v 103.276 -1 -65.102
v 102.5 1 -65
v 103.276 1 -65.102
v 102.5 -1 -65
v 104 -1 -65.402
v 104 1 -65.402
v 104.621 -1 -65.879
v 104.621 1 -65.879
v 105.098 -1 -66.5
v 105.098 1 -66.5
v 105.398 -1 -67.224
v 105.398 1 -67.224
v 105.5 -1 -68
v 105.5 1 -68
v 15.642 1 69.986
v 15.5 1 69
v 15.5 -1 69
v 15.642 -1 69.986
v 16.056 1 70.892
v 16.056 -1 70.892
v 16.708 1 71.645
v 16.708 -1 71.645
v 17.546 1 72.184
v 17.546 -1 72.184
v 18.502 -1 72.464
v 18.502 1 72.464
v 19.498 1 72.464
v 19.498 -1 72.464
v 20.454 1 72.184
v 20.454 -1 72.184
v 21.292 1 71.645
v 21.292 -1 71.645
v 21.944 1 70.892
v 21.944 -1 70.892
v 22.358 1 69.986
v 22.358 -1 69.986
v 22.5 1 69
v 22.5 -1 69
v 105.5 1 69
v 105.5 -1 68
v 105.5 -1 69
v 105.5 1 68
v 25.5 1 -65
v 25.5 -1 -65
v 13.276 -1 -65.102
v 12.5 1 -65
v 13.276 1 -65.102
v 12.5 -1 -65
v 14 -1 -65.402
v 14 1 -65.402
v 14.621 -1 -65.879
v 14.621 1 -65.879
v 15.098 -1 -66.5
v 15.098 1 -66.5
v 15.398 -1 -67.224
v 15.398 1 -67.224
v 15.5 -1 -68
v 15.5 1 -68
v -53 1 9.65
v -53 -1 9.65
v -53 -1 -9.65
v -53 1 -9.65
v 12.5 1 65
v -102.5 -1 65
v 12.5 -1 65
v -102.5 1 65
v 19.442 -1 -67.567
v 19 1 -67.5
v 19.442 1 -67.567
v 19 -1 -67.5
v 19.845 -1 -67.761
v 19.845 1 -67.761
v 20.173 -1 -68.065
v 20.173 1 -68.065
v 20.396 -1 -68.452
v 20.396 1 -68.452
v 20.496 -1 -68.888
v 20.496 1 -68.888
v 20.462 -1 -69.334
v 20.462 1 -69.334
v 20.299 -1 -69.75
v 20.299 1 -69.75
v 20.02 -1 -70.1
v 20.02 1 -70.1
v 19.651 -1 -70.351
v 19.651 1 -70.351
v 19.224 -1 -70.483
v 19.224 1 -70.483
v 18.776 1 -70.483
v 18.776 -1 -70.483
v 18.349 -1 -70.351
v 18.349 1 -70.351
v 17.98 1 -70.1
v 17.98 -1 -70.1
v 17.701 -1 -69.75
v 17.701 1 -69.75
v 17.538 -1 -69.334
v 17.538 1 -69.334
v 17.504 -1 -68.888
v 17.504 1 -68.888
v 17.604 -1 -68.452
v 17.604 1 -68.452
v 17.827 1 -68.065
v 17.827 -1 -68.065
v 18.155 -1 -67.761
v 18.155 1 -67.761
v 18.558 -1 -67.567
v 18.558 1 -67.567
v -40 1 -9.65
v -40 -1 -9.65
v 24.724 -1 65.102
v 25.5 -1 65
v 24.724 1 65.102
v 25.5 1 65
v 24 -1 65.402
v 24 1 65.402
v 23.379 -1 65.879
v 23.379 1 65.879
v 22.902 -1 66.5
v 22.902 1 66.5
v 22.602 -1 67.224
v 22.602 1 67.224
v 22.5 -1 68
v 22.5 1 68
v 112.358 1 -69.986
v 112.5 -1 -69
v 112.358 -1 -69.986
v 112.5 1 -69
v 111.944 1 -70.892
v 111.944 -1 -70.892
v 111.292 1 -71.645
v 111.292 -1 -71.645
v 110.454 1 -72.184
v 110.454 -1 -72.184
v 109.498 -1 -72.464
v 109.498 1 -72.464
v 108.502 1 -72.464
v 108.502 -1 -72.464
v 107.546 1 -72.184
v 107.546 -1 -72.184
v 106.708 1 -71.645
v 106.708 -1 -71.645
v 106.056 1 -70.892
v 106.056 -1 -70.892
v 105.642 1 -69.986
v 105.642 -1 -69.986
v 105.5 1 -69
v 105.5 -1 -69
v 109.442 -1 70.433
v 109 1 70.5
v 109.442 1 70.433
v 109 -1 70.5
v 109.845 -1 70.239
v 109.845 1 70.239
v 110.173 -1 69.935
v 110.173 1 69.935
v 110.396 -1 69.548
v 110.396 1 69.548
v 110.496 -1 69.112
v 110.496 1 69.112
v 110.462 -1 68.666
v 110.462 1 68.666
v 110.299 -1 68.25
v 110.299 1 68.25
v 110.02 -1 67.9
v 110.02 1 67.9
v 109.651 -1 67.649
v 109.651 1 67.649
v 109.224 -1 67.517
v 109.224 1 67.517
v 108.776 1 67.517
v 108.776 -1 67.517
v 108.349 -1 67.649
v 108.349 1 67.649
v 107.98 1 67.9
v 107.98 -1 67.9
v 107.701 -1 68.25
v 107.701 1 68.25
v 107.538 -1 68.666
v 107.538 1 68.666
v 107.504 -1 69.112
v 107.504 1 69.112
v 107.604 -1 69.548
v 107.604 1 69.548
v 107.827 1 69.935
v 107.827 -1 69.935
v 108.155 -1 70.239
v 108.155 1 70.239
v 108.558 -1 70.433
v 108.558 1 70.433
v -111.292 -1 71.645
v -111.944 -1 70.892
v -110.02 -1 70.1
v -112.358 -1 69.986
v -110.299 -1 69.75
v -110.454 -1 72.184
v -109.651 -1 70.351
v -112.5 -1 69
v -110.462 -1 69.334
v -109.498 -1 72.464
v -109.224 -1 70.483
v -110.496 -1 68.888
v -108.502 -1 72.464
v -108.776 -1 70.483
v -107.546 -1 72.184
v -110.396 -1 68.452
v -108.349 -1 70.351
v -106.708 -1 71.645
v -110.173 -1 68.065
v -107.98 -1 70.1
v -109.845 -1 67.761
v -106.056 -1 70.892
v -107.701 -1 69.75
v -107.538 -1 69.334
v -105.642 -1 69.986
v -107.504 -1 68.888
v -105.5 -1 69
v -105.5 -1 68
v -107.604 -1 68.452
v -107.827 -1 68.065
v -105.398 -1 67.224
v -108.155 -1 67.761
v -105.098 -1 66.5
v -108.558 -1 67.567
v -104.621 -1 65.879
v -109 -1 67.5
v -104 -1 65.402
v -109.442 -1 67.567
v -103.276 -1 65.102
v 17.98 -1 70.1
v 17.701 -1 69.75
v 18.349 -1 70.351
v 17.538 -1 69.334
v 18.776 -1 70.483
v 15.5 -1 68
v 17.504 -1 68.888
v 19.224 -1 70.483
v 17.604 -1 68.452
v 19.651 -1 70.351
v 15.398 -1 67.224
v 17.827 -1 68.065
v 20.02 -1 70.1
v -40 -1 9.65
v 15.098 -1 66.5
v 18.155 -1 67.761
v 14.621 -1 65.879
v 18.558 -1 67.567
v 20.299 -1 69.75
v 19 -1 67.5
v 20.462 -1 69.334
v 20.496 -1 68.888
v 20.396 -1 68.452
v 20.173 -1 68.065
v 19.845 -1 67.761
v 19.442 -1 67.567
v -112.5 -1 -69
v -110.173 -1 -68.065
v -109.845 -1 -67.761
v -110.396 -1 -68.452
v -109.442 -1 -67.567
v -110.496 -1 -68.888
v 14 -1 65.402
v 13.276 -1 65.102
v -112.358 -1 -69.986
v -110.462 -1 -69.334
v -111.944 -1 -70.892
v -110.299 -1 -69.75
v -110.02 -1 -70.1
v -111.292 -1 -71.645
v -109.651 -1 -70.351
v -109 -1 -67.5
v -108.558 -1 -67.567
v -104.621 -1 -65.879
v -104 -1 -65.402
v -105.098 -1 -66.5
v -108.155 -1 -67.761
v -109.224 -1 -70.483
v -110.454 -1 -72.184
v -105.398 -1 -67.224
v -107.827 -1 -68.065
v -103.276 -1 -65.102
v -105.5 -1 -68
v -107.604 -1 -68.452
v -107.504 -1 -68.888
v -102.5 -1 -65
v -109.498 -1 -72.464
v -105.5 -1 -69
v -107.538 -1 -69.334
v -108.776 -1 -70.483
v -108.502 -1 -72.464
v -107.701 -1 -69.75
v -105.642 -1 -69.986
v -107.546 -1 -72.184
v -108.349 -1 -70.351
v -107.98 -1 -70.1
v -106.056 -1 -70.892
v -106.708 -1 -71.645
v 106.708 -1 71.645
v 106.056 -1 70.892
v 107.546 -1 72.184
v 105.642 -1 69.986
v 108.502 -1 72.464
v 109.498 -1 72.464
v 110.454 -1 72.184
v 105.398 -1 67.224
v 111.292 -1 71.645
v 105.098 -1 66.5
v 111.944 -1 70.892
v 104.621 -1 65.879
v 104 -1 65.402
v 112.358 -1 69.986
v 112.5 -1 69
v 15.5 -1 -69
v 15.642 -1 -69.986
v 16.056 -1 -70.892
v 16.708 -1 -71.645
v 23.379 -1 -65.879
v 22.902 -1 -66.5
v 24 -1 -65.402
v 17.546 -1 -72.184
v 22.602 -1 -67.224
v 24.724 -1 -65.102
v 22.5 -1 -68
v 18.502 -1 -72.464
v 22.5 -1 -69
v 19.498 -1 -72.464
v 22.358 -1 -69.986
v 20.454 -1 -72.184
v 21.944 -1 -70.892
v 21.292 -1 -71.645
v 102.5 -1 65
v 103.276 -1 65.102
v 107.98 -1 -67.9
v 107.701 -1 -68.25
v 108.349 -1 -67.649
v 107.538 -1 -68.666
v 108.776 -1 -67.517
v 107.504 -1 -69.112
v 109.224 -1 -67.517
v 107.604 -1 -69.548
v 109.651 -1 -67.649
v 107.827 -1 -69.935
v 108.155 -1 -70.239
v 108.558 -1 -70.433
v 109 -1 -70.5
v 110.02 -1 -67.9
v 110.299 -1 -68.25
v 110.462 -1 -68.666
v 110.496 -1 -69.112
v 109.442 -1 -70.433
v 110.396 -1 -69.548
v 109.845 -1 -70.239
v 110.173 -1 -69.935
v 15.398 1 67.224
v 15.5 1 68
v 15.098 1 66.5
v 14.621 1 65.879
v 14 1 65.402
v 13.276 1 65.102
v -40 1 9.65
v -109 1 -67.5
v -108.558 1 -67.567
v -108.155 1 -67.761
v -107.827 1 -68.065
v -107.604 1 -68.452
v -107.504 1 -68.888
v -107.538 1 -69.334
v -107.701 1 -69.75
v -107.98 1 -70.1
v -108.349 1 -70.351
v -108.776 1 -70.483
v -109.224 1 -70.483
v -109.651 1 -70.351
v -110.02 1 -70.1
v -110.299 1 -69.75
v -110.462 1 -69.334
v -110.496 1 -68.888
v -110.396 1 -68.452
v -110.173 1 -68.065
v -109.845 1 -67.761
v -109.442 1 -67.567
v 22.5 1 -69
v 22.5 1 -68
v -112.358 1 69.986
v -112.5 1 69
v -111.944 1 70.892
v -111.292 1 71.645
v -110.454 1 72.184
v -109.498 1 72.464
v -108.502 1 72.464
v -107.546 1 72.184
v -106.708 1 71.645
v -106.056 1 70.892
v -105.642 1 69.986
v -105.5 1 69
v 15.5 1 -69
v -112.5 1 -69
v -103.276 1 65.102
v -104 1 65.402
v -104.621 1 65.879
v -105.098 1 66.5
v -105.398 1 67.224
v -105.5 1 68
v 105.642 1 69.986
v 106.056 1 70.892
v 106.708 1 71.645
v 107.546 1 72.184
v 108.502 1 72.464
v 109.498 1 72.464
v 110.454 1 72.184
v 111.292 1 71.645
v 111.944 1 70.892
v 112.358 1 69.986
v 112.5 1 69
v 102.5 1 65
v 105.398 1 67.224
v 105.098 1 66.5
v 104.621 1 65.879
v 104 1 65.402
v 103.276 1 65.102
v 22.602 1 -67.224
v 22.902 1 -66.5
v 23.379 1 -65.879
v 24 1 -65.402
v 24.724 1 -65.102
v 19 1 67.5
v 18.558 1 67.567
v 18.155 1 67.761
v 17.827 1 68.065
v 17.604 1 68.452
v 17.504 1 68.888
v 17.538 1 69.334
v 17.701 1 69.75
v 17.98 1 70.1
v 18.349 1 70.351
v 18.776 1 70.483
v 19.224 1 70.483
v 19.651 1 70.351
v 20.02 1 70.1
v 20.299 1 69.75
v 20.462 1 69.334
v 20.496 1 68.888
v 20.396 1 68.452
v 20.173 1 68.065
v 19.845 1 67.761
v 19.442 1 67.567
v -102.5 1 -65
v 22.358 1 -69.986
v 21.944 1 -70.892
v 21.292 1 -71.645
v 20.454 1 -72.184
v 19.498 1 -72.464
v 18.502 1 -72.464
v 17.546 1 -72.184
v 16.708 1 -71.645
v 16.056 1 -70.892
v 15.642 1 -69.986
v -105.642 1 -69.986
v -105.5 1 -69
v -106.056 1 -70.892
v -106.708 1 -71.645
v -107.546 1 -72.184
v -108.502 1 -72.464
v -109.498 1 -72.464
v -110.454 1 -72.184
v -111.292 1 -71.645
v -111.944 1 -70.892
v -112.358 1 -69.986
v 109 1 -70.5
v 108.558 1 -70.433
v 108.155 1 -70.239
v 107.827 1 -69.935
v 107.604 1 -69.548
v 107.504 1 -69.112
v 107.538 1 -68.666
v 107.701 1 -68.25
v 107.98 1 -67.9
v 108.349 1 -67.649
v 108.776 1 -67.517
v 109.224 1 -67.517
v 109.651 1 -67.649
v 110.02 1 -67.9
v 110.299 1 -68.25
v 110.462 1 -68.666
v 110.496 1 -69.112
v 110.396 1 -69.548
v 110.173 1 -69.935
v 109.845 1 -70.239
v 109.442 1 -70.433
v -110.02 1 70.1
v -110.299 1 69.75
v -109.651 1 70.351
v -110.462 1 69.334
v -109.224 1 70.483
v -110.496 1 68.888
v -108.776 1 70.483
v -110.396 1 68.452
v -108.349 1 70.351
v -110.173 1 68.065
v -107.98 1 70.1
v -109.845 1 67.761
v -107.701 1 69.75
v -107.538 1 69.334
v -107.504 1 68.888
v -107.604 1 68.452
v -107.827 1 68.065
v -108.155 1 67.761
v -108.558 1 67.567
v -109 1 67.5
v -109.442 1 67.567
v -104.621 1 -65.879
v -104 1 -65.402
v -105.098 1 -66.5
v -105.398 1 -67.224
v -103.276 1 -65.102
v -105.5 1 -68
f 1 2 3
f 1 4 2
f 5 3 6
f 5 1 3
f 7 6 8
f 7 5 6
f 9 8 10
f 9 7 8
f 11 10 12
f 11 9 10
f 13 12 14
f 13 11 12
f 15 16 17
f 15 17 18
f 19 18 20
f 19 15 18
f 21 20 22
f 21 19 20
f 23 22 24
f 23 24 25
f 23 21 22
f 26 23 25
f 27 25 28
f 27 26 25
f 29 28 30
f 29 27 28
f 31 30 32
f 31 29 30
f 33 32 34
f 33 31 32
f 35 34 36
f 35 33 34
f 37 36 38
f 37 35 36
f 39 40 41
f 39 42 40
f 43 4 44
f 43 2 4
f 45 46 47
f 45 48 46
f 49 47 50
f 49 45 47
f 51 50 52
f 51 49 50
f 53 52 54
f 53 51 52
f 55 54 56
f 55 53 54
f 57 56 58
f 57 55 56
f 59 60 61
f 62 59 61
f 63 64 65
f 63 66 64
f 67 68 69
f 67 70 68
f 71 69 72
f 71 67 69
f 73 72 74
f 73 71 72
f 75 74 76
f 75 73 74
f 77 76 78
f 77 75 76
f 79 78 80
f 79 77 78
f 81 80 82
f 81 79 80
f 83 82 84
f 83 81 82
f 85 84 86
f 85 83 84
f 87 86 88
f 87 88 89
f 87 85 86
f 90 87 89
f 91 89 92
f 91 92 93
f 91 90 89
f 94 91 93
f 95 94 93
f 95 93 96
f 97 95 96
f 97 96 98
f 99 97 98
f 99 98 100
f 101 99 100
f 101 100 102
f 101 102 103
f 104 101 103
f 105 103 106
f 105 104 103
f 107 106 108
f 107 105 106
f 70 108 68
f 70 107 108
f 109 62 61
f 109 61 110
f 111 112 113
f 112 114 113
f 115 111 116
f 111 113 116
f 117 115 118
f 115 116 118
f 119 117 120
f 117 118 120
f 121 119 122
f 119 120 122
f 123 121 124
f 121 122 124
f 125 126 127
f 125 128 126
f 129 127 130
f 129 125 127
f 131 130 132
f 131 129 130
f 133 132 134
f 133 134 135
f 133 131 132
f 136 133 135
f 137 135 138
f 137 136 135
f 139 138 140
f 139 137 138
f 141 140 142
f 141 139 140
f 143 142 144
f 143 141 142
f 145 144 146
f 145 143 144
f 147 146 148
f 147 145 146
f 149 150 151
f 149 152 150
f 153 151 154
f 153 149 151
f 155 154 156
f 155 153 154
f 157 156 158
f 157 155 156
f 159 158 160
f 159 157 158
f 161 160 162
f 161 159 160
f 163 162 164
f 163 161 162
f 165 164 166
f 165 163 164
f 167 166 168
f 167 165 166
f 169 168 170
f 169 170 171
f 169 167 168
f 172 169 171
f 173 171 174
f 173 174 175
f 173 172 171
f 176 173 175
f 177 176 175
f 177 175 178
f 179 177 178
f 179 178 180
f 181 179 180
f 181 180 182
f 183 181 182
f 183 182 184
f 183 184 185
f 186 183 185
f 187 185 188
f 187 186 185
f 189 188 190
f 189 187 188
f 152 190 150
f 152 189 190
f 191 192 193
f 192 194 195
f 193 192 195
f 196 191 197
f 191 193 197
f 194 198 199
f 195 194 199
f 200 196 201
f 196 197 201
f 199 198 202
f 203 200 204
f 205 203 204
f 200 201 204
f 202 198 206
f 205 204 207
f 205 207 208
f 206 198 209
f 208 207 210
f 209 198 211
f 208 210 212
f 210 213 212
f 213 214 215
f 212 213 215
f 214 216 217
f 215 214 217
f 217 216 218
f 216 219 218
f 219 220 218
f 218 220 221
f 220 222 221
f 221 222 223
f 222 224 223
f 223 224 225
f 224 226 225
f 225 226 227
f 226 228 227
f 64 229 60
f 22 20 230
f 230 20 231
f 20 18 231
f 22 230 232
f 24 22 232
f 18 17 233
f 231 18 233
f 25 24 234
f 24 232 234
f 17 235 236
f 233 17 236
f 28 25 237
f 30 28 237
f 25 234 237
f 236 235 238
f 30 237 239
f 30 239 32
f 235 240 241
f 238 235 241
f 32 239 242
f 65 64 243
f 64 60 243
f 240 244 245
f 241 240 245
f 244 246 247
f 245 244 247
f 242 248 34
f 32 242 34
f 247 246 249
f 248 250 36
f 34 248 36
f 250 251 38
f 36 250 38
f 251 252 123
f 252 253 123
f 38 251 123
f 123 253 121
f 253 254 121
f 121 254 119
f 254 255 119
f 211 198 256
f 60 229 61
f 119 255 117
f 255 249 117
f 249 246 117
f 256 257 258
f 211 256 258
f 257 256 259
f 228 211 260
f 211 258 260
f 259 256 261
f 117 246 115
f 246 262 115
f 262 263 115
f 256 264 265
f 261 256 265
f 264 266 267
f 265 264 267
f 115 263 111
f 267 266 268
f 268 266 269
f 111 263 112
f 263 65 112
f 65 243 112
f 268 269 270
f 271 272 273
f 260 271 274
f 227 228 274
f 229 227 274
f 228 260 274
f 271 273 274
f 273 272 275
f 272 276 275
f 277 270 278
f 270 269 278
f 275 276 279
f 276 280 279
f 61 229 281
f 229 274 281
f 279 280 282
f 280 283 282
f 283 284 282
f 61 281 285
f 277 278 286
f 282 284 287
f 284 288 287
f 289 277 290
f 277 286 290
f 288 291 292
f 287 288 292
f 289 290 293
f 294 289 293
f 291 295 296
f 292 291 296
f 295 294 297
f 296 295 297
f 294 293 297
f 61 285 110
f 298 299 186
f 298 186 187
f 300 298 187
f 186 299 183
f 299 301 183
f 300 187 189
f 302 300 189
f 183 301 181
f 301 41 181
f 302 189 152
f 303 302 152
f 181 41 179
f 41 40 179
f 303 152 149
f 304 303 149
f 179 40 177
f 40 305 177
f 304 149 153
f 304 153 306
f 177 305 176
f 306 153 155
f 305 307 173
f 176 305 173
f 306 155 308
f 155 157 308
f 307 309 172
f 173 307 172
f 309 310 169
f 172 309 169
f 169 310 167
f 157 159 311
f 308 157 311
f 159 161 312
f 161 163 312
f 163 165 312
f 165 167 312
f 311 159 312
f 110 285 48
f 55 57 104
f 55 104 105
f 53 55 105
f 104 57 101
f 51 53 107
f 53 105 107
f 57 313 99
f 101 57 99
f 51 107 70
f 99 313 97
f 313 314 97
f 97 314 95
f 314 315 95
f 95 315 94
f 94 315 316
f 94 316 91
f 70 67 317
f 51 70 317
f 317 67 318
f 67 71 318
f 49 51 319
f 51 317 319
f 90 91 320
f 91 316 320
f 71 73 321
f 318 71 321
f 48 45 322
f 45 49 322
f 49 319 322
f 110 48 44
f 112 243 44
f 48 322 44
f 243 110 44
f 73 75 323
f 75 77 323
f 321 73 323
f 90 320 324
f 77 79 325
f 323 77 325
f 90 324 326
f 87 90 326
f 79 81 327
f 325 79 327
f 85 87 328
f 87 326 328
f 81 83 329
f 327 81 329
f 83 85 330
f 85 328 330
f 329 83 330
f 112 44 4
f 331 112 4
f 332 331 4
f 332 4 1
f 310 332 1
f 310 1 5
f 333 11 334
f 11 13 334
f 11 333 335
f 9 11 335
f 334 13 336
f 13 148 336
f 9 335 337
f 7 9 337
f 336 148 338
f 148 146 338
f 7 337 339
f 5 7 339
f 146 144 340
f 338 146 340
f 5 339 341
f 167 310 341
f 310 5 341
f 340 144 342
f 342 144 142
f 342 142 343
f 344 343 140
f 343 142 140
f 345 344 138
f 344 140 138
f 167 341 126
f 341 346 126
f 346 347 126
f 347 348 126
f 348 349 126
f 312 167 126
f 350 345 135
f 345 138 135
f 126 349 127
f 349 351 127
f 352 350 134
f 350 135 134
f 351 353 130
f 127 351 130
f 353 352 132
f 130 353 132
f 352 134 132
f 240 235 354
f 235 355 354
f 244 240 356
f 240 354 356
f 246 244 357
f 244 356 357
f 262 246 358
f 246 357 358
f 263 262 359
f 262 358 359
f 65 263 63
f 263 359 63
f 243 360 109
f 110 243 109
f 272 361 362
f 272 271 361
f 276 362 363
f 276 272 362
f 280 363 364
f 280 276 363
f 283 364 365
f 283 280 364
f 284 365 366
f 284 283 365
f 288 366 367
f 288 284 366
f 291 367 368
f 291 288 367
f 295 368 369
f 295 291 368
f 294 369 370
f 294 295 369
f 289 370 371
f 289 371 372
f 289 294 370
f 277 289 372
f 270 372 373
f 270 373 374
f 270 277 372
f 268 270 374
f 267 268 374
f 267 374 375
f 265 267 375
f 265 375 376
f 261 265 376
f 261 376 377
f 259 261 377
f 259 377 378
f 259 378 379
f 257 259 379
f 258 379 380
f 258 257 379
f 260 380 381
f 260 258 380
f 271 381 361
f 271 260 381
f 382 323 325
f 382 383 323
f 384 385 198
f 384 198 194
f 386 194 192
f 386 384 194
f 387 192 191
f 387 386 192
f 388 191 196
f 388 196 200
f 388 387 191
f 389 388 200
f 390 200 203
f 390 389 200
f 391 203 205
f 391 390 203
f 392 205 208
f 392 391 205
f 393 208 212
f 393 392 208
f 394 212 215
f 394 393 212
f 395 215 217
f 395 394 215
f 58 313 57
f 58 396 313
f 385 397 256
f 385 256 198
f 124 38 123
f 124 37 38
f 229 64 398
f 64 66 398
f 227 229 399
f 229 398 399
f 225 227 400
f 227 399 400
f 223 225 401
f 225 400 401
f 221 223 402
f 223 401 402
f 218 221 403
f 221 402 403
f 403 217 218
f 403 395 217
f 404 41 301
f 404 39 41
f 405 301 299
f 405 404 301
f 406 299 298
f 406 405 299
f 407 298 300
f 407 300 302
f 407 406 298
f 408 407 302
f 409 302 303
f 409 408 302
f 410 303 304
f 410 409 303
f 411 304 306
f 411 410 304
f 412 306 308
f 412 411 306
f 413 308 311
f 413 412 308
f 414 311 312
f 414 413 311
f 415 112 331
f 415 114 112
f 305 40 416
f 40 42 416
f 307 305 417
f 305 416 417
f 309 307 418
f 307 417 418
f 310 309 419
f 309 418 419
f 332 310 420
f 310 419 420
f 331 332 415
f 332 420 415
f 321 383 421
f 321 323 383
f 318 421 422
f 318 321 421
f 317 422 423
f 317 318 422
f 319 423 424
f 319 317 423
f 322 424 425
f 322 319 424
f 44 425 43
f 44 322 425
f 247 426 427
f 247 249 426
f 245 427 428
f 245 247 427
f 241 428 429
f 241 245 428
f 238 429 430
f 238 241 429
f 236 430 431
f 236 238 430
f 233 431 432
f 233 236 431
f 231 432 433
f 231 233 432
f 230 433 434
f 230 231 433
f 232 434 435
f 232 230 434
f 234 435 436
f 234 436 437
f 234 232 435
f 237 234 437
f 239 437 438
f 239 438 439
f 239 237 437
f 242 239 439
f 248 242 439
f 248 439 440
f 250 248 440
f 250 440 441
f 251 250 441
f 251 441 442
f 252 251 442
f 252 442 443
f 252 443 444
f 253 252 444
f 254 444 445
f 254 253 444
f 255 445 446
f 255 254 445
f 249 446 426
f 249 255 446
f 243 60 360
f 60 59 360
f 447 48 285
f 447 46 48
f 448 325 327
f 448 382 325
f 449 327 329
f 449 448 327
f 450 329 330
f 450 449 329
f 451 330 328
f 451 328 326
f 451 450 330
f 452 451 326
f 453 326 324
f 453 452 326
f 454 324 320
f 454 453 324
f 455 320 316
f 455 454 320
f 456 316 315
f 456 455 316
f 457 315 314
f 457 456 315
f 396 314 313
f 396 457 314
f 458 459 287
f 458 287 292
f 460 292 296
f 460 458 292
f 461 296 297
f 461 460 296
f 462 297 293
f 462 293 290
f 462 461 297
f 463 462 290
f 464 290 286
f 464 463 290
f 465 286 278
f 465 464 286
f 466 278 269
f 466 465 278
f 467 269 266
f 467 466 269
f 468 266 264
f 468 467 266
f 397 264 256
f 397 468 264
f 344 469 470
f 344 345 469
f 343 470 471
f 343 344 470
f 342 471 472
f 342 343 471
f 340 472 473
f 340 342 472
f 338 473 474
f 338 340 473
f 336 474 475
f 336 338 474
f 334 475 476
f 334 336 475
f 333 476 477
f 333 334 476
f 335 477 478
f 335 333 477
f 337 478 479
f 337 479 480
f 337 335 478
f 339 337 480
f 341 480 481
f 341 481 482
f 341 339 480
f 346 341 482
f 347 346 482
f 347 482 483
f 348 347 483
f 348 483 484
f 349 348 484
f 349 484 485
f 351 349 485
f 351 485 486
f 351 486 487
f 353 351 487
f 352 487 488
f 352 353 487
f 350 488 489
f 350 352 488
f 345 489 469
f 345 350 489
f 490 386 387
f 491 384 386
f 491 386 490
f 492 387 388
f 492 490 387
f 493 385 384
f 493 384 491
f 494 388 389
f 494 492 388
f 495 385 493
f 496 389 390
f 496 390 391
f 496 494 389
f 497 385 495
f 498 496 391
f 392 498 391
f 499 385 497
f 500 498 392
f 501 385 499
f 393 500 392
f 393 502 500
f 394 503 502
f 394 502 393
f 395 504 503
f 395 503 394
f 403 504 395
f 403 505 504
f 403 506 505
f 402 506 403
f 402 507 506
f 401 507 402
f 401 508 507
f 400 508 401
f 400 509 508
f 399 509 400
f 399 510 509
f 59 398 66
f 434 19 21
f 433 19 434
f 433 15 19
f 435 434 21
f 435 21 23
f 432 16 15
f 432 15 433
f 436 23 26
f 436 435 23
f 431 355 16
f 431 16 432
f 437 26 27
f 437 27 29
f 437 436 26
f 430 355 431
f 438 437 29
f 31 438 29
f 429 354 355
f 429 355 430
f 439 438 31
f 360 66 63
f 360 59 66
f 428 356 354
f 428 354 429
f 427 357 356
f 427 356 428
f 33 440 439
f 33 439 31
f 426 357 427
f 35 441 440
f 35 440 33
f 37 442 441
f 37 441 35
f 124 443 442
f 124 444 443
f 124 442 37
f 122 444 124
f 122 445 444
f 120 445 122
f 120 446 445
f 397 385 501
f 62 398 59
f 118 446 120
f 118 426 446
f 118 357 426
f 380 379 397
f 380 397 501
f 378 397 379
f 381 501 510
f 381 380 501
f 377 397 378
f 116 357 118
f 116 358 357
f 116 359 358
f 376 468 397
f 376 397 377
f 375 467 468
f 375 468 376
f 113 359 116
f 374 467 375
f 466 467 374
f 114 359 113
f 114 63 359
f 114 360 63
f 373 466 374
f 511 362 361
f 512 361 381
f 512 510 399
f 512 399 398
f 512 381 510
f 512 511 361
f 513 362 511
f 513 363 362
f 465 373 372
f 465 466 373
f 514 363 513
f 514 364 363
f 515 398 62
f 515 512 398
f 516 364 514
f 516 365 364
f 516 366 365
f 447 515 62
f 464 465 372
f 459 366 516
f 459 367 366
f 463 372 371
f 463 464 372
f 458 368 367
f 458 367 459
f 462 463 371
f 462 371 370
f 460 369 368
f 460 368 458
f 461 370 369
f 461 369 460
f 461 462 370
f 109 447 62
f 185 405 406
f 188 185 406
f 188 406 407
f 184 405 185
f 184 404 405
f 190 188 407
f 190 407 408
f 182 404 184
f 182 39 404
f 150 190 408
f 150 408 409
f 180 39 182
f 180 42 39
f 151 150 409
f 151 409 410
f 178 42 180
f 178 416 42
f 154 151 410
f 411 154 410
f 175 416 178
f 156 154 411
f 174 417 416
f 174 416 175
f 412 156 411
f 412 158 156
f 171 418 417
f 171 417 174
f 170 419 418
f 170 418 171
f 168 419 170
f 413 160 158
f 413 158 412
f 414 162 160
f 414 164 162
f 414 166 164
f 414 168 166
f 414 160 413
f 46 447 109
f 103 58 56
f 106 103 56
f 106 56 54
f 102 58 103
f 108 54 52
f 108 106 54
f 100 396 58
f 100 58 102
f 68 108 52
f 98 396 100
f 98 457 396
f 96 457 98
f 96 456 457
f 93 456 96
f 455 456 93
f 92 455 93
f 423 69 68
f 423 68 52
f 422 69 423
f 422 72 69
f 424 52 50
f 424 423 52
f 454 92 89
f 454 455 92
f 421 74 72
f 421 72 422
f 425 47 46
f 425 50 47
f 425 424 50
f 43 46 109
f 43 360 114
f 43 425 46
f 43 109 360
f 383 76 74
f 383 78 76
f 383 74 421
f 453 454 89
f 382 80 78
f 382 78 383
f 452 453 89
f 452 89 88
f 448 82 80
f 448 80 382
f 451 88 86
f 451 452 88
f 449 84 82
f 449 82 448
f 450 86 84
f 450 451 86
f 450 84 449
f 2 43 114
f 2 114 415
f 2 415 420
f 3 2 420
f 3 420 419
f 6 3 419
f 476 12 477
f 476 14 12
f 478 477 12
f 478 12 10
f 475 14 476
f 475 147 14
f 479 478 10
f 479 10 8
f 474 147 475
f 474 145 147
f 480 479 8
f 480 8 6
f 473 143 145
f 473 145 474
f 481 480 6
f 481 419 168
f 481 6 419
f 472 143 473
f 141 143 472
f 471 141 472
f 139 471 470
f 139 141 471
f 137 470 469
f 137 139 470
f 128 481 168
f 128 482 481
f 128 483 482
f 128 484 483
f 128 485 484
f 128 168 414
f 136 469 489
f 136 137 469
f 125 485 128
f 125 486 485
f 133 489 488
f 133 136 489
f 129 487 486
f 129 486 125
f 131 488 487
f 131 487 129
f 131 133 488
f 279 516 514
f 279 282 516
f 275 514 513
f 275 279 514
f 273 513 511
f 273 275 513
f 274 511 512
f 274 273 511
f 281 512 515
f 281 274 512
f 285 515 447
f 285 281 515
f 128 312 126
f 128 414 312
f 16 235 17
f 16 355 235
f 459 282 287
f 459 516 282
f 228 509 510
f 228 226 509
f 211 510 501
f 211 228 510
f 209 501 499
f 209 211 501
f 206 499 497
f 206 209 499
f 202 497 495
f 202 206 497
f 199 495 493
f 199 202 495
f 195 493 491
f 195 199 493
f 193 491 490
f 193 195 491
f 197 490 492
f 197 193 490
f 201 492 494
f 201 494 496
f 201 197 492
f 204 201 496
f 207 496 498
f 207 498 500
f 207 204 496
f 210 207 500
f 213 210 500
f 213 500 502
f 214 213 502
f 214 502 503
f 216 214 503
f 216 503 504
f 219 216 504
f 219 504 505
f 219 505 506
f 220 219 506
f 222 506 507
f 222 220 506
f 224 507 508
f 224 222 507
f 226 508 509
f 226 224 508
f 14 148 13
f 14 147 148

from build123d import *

# Parameters (mm, degrees)
SKETCH1_R           = 1.5
SKETCH1_W           = 13
SKETCH1_H           = 19.3
BOSS_EXTRUDE1_DEPTH = 1
FILLET1_R           = 3


with BuildPart() as part:
    # Sketch1 → Boss-Extrude1 (new, symmetric)
    with BuildSketch(Plane(origin=(0, 0, 0), x_dir=(1, 0, 0), z_dir=(0, 1, 0))):
        with BuildLine():
            Line((-105.5, 65), (-105.5, 69))
            ThreePointArc((-105.5, 69), (-109, 72.5), (-112.5, 69))
            Line((-112.5, 69), (-112.5, 65))
            Line((-112.5, 65), (-112.5, -65))
            Line((-112.5, -65), (-112.5, -69))
            ThreePointArc((-112.5, -69), (-109, -72.5), (-105.5, -69))
            Line((-105.5, -69), (-105.5, -65))
            Line((-105.5, -65), (15.5, -65))
            Line((15.5, -65), (15.5, -69))
            ThreePointArc((15.5, -69), (19, -72.5), (22.5, -69))
            Line((22.5, -69), (22.5, -65))
            Line((22.5, -65), (105.5, -65))
            Line((105.5, -65), (105.5, -69))
            ThreePointArc((105.5, -69), (109, -72.5), (112.5, -69))
            Line((112.5, -69), (112.5, -65))
            Line((112.5, -65), (112.5, 65))
            Line((112.5, 65), (112.5, 69))
            ThreePointArc((112.5, 69), (109, 72.5), (105.5, 69))
            Line((105.5, 69), (105.5, 65))
            Line((105.5, 65), (22.5, 65))
            Line((22.5, 65), (22.5, 69))
            ThreePointArc((22.5, 69), (19, 72.5), (15.5, 69))
            Line((15.5, 69), (15.5, 65))
            Line((15.5, 65), (-105.5, 65))
        make_face()
        with Locations(Location((-109, 69, 0), (0, 0, 270))):
            Circle(SKETCH1_R, mode=Mode.SUBTRACT)
        with Locations(Location((109, 69, 0), (0, 0, 90))):
            Circle(SKETCH1_R, mode=Mode.SUBTRACT)
        with Locations(Location((19, 69, 0), (0, 0, 270))):
            Circle(SKETCH1_R, mode=Mode.SUBTRACT)
        with Locations(Location((19, -69, 0), (0, 0, 90))):
            Circle(SKETCH1_R, mode=Mode.SUBTRACT)
        with Locations(Location((109, -69, 0), (0, 0, 270))):
            Circle(SKETCH1_R, mode=Mode.SUBTRACT)
        with Locations(Location((-109, -69, 0), (0, 0, 90))):
            Circle(SKETCH1_R, mode=Mode.SUBTRACT)
        with Locations((-46.5, 0)):
            Rectangle(SKETCH1_W, SKETCH1_H, mode=Mode.SUBTRACT)
    extrude(amount=BOSS_EXTRUDE1_DEPTH, both=True)

    # Fillet1
    fillet1_edges = [part.edges().sort_by_distance(p)[0] for p in [
        (-105.5, 0, -65),
        (15.5, 0, -65),
        (22.5, 0, -65),
        (105.5, 0, -65),
        (105.5, 0, 65),
        (22.5, 0, 65),
        (15.5, 0, 65),
        (-105.5, 0, 65),
    ]]
    fillet(fillet1_edges, radius=FILLET1_R)


solid = part.part
